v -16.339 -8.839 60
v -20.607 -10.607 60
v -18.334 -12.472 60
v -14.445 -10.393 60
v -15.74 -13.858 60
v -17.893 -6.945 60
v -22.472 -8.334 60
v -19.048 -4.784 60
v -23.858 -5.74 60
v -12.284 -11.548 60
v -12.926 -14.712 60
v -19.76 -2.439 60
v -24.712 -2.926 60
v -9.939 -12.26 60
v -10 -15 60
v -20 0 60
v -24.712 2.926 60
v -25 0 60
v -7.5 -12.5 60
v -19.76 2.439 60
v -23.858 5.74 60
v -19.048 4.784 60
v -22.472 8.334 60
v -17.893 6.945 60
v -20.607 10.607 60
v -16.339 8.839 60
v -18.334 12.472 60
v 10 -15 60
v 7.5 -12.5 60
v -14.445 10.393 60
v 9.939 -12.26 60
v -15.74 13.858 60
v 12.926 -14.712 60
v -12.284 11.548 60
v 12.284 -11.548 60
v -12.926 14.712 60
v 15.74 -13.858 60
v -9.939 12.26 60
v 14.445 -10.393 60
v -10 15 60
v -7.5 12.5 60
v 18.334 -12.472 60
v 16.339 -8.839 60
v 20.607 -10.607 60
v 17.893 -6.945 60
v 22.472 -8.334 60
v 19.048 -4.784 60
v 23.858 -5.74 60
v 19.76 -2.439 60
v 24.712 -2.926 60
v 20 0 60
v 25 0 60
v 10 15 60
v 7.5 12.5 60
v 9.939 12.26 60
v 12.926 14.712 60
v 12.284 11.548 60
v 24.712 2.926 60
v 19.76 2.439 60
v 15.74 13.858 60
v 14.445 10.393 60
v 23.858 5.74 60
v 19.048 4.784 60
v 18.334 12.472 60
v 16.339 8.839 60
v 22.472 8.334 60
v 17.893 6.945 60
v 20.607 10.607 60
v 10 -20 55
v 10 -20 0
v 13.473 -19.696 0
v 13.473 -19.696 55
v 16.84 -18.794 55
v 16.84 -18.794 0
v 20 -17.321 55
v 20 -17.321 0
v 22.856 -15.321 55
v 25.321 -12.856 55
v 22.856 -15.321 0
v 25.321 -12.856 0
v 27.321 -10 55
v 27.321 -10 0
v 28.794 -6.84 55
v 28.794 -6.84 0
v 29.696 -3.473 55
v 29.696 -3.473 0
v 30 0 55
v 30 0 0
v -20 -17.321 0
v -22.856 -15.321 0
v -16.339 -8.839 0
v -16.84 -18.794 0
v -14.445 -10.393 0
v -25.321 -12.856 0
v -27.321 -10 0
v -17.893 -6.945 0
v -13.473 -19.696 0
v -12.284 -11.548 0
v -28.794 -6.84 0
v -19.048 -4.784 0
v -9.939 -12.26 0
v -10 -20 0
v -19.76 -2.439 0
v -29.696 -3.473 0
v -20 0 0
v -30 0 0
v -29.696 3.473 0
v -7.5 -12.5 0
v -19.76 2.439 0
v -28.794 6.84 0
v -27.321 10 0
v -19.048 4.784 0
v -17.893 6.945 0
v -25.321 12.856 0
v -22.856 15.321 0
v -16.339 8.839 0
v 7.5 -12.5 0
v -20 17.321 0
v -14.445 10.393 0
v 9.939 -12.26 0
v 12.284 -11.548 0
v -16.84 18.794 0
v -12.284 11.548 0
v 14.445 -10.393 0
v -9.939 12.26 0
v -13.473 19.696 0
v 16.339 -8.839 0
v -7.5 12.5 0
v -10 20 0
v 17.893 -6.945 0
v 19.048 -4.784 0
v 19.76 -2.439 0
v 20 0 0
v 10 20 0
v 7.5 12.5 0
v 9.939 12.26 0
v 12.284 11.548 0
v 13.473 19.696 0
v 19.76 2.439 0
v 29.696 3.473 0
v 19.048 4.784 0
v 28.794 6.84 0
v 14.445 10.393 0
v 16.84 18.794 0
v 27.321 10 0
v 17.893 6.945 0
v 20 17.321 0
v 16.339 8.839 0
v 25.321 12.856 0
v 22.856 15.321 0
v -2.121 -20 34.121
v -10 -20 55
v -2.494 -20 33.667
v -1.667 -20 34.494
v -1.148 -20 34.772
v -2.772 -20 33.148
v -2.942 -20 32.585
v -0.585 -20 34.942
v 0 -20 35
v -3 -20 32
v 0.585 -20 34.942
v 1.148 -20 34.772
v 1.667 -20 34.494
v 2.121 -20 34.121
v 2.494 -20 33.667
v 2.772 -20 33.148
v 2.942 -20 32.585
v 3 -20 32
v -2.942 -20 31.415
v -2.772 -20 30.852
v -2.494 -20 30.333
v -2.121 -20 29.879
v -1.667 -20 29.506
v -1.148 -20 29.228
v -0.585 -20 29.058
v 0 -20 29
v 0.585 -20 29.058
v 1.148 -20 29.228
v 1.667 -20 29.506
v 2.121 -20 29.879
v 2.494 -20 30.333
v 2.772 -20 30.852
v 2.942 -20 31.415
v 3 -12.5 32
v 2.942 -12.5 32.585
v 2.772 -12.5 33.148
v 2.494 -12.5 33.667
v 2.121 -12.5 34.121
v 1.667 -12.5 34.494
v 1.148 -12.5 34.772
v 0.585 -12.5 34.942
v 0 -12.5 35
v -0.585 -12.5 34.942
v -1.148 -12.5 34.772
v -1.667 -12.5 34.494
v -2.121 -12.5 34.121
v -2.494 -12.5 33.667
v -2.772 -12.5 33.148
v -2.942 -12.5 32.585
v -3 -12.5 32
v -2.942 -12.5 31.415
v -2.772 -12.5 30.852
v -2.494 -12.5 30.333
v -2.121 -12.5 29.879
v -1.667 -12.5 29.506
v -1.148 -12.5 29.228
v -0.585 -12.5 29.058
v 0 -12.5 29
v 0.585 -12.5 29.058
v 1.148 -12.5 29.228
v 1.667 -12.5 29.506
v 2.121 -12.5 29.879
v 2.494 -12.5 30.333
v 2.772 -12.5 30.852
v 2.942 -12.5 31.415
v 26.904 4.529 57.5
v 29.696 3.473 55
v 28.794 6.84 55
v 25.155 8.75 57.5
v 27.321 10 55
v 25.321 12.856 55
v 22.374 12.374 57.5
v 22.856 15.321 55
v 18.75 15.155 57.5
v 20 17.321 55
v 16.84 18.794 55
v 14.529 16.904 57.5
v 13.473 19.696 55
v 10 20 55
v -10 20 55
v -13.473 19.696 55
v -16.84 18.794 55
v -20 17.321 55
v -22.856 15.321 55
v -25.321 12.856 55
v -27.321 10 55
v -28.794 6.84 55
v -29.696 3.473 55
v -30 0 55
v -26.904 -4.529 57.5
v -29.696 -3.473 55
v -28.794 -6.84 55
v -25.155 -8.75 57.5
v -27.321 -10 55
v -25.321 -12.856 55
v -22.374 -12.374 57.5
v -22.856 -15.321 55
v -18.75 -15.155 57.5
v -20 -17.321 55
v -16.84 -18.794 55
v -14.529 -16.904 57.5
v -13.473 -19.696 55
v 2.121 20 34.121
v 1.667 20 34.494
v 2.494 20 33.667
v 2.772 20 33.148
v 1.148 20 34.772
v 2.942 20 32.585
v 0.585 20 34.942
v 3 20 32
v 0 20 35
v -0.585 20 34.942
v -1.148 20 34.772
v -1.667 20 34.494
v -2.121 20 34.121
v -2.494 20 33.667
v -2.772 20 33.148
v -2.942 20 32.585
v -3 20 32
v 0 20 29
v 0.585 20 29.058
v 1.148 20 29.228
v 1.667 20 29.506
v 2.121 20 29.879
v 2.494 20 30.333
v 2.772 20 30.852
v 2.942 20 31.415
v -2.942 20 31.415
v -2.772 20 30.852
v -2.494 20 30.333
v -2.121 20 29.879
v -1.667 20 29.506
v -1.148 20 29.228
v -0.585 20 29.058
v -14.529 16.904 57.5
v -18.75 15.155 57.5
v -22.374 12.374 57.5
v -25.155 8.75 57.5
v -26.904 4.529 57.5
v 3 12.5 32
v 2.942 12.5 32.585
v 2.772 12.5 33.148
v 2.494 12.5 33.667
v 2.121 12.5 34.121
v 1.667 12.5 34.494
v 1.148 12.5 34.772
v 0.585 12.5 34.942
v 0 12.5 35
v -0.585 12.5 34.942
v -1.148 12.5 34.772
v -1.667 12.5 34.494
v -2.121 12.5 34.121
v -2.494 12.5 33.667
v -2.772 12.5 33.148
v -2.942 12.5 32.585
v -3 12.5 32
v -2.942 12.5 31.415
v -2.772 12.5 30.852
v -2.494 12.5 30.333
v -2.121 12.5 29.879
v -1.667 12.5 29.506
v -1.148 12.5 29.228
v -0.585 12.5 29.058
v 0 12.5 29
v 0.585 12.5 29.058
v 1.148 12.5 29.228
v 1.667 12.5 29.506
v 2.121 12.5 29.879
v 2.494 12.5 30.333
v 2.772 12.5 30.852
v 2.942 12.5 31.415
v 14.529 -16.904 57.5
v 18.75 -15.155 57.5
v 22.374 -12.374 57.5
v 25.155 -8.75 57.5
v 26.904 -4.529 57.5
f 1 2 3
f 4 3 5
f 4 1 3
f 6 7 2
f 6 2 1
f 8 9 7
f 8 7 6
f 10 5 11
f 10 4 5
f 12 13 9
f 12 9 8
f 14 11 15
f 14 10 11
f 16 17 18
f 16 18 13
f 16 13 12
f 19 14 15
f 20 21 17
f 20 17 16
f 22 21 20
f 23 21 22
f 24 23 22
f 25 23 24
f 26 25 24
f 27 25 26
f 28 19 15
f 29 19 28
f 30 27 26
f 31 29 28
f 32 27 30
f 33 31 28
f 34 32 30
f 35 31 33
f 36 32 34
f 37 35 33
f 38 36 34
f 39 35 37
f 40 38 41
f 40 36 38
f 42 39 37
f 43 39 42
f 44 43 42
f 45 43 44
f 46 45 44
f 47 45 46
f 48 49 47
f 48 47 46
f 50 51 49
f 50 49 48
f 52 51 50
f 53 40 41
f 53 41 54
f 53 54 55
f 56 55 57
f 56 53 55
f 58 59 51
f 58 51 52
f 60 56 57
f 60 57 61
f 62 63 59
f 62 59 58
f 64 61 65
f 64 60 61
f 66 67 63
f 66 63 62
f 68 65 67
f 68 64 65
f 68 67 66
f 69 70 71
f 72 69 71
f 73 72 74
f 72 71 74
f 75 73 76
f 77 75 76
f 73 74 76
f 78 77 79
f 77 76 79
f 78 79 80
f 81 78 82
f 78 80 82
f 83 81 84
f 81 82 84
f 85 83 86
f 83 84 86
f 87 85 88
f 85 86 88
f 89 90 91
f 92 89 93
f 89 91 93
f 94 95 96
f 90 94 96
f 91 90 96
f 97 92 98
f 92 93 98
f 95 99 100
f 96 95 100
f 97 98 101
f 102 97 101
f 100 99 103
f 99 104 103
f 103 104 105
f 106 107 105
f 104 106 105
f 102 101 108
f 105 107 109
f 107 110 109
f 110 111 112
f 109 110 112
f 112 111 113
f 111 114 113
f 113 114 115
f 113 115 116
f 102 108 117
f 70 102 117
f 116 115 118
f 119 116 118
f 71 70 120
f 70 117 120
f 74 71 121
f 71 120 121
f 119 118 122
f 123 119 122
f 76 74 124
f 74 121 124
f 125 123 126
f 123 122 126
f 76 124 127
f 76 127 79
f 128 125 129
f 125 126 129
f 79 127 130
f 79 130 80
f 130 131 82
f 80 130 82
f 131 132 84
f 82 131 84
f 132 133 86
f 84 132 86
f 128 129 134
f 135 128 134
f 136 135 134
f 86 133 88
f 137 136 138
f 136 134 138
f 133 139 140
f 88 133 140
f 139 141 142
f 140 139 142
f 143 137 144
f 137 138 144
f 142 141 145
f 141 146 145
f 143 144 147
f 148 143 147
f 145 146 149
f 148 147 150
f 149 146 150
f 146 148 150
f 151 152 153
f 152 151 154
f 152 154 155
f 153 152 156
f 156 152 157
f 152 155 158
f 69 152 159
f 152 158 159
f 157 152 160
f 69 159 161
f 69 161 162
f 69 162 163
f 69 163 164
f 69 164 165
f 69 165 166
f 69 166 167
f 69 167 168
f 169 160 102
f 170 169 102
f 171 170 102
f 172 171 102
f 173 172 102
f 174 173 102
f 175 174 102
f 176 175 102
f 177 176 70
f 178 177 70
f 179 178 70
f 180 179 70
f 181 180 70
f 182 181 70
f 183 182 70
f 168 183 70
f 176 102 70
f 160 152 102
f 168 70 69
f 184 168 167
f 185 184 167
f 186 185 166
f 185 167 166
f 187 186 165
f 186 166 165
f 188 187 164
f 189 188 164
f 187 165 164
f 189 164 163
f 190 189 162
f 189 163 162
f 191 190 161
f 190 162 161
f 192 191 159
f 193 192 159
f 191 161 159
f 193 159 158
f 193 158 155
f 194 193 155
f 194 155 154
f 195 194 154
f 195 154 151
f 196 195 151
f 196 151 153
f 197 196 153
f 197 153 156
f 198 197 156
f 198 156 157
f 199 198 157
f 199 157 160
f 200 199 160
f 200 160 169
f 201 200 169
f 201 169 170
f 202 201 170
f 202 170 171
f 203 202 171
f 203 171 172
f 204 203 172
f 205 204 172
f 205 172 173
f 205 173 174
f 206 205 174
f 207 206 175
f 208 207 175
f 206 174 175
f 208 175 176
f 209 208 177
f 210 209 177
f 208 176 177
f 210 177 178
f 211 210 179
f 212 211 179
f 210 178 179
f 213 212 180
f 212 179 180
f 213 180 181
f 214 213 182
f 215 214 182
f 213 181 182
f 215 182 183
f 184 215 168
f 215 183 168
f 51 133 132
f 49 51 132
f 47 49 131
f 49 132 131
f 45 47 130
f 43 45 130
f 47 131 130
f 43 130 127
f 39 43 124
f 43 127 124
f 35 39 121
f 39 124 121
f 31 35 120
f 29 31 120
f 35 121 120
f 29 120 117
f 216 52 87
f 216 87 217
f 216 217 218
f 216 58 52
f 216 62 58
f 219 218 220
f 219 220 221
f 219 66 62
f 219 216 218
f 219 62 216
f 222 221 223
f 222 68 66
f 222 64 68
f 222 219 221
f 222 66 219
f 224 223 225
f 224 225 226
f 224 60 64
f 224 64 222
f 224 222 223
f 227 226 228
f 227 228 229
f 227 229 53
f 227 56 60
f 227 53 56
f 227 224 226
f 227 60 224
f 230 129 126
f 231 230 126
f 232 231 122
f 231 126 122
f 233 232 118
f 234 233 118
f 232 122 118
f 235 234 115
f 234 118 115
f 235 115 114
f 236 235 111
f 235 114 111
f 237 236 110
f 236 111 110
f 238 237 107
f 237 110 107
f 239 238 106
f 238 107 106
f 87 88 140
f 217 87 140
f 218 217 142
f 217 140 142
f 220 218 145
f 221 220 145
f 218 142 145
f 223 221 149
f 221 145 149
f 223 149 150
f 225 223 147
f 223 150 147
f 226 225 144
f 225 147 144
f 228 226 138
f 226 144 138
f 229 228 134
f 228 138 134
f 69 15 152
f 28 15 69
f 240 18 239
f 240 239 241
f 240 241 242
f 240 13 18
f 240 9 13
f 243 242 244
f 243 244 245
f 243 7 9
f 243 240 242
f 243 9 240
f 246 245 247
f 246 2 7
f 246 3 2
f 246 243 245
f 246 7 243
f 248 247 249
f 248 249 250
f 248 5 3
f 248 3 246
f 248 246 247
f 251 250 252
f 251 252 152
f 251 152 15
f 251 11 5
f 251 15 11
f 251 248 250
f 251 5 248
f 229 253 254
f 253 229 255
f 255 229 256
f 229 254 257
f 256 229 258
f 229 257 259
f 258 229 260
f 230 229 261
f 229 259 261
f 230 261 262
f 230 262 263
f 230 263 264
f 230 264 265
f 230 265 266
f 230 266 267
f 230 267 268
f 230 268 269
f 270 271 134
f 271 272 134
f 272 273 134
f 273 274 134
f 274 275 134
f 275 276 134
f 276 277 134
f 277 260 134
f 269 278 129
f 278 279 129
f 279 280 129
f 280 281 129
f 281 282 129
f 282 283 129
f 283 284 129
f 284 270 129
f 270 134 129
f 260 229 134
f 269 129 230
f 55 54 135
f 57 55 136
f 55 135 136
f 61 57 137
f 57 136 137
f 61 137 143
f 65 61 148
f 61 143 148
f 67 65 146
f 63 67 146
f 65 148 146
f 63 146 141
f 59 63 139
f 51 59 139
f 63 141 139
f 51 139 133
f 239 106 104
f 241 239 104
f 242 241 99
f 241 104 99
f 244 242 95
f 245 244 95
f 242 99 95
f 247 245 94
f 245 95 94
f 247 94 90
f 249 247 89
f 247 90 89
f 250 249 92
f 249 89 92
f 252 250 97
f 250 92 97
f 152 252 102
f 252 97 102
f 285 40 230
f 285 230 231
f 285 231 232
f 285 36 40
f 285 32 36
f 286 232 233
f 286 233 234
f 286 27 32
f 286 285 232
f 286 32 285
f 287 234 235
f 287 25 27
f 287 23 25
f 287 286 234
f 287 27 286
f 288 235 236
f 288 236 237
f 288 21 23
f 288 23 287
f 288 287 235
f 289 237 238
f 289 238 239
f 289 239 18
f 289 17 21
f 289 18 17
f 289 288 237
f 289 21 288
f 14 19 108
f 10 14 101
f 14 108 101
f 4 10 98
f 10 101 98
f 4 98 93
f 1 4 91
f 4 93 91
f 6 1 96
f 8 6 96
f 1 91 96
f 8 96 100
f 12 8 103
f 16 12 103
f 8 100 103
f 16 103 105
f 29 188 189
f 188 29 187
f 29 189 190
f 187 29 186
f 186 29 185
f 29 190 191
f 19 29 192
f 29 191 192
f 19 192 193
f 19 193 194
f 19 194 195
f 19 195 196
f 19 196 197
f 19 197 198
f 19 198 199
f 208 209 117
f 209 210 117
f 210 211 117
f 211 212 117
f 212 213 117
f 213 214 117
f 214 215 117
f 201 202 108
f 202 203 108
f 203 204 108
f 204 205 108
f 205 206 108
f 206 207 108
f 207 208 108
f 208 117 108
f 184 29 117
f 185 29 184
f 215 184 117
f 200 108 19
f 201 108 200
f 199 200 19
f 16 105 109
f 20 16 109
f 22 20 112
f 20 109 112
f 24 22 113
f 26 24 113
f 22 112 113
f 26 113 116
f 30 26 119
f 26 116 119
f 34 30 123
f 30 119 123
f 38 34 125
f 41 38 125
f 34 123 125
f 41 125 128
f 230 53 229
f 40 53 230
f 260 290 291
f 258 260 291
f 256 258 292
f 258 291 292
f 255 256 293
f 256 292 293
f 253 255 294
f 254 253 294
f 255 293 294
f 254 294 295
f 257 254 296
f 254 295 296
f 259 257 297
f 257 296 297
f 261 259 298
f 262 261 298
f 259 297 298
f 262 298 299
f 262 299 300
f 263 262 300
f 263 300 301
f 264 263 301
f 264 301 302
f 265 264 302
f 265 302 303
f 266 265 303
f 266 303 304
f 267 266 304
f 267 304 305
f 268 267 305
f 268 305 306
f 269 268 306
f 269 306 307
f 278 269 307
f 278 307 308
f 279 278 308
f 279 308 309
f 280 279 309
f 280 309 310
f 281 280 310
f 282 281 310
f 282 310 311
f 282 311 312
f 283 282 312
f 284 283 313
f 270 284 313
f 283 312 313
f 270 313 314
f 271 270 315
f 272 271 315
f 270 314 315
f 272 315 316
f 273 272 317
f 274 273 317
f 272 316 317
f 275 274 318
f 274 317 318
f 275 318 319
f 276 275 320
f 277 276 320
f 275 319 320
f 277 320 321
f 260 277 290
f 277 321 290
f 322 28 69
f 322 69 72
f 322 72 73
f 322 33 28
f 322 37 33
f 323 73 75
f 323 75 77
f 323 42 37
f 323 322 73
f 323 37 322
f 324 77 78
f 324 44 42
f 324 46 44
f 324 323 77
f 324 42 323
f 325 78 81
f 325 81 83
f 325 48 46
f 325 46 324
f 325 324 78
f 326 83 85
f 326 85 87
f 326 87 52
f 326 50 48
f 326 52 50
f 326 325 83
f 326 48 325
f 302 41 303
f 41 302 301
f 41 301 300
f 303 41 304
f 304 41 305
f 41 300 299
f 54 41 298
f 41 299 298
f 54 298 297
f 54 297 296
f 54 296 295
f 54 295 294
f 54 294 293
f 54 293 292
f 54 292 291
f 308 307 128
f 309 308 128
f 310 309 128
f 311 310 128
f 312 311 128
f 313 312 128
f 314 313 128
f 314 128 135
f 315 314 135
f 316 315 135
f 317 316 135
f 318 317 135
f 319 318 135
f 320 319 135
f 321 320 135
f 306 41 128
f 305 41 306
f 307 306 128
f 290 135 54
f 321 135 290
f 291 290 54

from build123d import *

# Parameters (mm, degrees)
F1_DEPTH = 60
F2_SIZE  = 5
F3_R     = 3
F4_DEPTH = 40.001


with BuildPart() as f1:
    # F0 (on Top) → F1 (new body)
    with BuildSketch(Plane.XY):
        with BuildLine():
            ThreePointArc((30, 0), (24.1421356237, 14.1421356237), (10, 20))
            Line((10, 20), (-10, 20))
            ThreePointArc((-10, 20), (-24.1421356237, 14.1421356237), (-30, 0))
            ThreePointArc((-30, 0), (-24.1421356237, -14.1421356237), (-10, -20))
            Line((-10, -20), (10, -20))
            ThreePointArc((10, -20), (24.1421356237, -14.1421356237), (30, 0))
        make_face()
        with BuildLine():
            Line((-7.5, 12.5), (7.5, 12.5))
            ThreePointArc((7.5, 12.5), (16.3388347648, 8.8388347648), (20, 0))
            ThreePointArc((20, 0), (16.3388347648, -8.8388347648), (7.5, -12.5))
            Line((7.5, -12.5), (-7.5, -12.5))
            ThreePointArc((-7.5, -12.5), (-16.3388347648, -8.8388347648), (-20, 0))
            ThreePointArc((-20, 0), (-16.3388347648, 8.8388347648), (-7.5, 12.5))
        make_face(mode=Mode.SUBTRACT)
    extrude(amount=F1_DEPTH)

    # F2
    f2_edges = [f1.edges().sort_by_distance(p)[0] for p in [
        (30, 0, 60),
        (0, 20, 60),
        (-30, 0, 60),
        (0, -20, 60),
    ]]
    chamfer(f2_edges, length=F2_SIZE)

    # F3 (on face) → F4 (cut, through all)
    with BuildSketch(Plane.XZ.offset(20)):
        with Locations((0, 32)):
            Circle(F3_R)
    extrude(amount=-F4_DEPTH, mode=Mode.SUBTRACT)


solid = f1.part
